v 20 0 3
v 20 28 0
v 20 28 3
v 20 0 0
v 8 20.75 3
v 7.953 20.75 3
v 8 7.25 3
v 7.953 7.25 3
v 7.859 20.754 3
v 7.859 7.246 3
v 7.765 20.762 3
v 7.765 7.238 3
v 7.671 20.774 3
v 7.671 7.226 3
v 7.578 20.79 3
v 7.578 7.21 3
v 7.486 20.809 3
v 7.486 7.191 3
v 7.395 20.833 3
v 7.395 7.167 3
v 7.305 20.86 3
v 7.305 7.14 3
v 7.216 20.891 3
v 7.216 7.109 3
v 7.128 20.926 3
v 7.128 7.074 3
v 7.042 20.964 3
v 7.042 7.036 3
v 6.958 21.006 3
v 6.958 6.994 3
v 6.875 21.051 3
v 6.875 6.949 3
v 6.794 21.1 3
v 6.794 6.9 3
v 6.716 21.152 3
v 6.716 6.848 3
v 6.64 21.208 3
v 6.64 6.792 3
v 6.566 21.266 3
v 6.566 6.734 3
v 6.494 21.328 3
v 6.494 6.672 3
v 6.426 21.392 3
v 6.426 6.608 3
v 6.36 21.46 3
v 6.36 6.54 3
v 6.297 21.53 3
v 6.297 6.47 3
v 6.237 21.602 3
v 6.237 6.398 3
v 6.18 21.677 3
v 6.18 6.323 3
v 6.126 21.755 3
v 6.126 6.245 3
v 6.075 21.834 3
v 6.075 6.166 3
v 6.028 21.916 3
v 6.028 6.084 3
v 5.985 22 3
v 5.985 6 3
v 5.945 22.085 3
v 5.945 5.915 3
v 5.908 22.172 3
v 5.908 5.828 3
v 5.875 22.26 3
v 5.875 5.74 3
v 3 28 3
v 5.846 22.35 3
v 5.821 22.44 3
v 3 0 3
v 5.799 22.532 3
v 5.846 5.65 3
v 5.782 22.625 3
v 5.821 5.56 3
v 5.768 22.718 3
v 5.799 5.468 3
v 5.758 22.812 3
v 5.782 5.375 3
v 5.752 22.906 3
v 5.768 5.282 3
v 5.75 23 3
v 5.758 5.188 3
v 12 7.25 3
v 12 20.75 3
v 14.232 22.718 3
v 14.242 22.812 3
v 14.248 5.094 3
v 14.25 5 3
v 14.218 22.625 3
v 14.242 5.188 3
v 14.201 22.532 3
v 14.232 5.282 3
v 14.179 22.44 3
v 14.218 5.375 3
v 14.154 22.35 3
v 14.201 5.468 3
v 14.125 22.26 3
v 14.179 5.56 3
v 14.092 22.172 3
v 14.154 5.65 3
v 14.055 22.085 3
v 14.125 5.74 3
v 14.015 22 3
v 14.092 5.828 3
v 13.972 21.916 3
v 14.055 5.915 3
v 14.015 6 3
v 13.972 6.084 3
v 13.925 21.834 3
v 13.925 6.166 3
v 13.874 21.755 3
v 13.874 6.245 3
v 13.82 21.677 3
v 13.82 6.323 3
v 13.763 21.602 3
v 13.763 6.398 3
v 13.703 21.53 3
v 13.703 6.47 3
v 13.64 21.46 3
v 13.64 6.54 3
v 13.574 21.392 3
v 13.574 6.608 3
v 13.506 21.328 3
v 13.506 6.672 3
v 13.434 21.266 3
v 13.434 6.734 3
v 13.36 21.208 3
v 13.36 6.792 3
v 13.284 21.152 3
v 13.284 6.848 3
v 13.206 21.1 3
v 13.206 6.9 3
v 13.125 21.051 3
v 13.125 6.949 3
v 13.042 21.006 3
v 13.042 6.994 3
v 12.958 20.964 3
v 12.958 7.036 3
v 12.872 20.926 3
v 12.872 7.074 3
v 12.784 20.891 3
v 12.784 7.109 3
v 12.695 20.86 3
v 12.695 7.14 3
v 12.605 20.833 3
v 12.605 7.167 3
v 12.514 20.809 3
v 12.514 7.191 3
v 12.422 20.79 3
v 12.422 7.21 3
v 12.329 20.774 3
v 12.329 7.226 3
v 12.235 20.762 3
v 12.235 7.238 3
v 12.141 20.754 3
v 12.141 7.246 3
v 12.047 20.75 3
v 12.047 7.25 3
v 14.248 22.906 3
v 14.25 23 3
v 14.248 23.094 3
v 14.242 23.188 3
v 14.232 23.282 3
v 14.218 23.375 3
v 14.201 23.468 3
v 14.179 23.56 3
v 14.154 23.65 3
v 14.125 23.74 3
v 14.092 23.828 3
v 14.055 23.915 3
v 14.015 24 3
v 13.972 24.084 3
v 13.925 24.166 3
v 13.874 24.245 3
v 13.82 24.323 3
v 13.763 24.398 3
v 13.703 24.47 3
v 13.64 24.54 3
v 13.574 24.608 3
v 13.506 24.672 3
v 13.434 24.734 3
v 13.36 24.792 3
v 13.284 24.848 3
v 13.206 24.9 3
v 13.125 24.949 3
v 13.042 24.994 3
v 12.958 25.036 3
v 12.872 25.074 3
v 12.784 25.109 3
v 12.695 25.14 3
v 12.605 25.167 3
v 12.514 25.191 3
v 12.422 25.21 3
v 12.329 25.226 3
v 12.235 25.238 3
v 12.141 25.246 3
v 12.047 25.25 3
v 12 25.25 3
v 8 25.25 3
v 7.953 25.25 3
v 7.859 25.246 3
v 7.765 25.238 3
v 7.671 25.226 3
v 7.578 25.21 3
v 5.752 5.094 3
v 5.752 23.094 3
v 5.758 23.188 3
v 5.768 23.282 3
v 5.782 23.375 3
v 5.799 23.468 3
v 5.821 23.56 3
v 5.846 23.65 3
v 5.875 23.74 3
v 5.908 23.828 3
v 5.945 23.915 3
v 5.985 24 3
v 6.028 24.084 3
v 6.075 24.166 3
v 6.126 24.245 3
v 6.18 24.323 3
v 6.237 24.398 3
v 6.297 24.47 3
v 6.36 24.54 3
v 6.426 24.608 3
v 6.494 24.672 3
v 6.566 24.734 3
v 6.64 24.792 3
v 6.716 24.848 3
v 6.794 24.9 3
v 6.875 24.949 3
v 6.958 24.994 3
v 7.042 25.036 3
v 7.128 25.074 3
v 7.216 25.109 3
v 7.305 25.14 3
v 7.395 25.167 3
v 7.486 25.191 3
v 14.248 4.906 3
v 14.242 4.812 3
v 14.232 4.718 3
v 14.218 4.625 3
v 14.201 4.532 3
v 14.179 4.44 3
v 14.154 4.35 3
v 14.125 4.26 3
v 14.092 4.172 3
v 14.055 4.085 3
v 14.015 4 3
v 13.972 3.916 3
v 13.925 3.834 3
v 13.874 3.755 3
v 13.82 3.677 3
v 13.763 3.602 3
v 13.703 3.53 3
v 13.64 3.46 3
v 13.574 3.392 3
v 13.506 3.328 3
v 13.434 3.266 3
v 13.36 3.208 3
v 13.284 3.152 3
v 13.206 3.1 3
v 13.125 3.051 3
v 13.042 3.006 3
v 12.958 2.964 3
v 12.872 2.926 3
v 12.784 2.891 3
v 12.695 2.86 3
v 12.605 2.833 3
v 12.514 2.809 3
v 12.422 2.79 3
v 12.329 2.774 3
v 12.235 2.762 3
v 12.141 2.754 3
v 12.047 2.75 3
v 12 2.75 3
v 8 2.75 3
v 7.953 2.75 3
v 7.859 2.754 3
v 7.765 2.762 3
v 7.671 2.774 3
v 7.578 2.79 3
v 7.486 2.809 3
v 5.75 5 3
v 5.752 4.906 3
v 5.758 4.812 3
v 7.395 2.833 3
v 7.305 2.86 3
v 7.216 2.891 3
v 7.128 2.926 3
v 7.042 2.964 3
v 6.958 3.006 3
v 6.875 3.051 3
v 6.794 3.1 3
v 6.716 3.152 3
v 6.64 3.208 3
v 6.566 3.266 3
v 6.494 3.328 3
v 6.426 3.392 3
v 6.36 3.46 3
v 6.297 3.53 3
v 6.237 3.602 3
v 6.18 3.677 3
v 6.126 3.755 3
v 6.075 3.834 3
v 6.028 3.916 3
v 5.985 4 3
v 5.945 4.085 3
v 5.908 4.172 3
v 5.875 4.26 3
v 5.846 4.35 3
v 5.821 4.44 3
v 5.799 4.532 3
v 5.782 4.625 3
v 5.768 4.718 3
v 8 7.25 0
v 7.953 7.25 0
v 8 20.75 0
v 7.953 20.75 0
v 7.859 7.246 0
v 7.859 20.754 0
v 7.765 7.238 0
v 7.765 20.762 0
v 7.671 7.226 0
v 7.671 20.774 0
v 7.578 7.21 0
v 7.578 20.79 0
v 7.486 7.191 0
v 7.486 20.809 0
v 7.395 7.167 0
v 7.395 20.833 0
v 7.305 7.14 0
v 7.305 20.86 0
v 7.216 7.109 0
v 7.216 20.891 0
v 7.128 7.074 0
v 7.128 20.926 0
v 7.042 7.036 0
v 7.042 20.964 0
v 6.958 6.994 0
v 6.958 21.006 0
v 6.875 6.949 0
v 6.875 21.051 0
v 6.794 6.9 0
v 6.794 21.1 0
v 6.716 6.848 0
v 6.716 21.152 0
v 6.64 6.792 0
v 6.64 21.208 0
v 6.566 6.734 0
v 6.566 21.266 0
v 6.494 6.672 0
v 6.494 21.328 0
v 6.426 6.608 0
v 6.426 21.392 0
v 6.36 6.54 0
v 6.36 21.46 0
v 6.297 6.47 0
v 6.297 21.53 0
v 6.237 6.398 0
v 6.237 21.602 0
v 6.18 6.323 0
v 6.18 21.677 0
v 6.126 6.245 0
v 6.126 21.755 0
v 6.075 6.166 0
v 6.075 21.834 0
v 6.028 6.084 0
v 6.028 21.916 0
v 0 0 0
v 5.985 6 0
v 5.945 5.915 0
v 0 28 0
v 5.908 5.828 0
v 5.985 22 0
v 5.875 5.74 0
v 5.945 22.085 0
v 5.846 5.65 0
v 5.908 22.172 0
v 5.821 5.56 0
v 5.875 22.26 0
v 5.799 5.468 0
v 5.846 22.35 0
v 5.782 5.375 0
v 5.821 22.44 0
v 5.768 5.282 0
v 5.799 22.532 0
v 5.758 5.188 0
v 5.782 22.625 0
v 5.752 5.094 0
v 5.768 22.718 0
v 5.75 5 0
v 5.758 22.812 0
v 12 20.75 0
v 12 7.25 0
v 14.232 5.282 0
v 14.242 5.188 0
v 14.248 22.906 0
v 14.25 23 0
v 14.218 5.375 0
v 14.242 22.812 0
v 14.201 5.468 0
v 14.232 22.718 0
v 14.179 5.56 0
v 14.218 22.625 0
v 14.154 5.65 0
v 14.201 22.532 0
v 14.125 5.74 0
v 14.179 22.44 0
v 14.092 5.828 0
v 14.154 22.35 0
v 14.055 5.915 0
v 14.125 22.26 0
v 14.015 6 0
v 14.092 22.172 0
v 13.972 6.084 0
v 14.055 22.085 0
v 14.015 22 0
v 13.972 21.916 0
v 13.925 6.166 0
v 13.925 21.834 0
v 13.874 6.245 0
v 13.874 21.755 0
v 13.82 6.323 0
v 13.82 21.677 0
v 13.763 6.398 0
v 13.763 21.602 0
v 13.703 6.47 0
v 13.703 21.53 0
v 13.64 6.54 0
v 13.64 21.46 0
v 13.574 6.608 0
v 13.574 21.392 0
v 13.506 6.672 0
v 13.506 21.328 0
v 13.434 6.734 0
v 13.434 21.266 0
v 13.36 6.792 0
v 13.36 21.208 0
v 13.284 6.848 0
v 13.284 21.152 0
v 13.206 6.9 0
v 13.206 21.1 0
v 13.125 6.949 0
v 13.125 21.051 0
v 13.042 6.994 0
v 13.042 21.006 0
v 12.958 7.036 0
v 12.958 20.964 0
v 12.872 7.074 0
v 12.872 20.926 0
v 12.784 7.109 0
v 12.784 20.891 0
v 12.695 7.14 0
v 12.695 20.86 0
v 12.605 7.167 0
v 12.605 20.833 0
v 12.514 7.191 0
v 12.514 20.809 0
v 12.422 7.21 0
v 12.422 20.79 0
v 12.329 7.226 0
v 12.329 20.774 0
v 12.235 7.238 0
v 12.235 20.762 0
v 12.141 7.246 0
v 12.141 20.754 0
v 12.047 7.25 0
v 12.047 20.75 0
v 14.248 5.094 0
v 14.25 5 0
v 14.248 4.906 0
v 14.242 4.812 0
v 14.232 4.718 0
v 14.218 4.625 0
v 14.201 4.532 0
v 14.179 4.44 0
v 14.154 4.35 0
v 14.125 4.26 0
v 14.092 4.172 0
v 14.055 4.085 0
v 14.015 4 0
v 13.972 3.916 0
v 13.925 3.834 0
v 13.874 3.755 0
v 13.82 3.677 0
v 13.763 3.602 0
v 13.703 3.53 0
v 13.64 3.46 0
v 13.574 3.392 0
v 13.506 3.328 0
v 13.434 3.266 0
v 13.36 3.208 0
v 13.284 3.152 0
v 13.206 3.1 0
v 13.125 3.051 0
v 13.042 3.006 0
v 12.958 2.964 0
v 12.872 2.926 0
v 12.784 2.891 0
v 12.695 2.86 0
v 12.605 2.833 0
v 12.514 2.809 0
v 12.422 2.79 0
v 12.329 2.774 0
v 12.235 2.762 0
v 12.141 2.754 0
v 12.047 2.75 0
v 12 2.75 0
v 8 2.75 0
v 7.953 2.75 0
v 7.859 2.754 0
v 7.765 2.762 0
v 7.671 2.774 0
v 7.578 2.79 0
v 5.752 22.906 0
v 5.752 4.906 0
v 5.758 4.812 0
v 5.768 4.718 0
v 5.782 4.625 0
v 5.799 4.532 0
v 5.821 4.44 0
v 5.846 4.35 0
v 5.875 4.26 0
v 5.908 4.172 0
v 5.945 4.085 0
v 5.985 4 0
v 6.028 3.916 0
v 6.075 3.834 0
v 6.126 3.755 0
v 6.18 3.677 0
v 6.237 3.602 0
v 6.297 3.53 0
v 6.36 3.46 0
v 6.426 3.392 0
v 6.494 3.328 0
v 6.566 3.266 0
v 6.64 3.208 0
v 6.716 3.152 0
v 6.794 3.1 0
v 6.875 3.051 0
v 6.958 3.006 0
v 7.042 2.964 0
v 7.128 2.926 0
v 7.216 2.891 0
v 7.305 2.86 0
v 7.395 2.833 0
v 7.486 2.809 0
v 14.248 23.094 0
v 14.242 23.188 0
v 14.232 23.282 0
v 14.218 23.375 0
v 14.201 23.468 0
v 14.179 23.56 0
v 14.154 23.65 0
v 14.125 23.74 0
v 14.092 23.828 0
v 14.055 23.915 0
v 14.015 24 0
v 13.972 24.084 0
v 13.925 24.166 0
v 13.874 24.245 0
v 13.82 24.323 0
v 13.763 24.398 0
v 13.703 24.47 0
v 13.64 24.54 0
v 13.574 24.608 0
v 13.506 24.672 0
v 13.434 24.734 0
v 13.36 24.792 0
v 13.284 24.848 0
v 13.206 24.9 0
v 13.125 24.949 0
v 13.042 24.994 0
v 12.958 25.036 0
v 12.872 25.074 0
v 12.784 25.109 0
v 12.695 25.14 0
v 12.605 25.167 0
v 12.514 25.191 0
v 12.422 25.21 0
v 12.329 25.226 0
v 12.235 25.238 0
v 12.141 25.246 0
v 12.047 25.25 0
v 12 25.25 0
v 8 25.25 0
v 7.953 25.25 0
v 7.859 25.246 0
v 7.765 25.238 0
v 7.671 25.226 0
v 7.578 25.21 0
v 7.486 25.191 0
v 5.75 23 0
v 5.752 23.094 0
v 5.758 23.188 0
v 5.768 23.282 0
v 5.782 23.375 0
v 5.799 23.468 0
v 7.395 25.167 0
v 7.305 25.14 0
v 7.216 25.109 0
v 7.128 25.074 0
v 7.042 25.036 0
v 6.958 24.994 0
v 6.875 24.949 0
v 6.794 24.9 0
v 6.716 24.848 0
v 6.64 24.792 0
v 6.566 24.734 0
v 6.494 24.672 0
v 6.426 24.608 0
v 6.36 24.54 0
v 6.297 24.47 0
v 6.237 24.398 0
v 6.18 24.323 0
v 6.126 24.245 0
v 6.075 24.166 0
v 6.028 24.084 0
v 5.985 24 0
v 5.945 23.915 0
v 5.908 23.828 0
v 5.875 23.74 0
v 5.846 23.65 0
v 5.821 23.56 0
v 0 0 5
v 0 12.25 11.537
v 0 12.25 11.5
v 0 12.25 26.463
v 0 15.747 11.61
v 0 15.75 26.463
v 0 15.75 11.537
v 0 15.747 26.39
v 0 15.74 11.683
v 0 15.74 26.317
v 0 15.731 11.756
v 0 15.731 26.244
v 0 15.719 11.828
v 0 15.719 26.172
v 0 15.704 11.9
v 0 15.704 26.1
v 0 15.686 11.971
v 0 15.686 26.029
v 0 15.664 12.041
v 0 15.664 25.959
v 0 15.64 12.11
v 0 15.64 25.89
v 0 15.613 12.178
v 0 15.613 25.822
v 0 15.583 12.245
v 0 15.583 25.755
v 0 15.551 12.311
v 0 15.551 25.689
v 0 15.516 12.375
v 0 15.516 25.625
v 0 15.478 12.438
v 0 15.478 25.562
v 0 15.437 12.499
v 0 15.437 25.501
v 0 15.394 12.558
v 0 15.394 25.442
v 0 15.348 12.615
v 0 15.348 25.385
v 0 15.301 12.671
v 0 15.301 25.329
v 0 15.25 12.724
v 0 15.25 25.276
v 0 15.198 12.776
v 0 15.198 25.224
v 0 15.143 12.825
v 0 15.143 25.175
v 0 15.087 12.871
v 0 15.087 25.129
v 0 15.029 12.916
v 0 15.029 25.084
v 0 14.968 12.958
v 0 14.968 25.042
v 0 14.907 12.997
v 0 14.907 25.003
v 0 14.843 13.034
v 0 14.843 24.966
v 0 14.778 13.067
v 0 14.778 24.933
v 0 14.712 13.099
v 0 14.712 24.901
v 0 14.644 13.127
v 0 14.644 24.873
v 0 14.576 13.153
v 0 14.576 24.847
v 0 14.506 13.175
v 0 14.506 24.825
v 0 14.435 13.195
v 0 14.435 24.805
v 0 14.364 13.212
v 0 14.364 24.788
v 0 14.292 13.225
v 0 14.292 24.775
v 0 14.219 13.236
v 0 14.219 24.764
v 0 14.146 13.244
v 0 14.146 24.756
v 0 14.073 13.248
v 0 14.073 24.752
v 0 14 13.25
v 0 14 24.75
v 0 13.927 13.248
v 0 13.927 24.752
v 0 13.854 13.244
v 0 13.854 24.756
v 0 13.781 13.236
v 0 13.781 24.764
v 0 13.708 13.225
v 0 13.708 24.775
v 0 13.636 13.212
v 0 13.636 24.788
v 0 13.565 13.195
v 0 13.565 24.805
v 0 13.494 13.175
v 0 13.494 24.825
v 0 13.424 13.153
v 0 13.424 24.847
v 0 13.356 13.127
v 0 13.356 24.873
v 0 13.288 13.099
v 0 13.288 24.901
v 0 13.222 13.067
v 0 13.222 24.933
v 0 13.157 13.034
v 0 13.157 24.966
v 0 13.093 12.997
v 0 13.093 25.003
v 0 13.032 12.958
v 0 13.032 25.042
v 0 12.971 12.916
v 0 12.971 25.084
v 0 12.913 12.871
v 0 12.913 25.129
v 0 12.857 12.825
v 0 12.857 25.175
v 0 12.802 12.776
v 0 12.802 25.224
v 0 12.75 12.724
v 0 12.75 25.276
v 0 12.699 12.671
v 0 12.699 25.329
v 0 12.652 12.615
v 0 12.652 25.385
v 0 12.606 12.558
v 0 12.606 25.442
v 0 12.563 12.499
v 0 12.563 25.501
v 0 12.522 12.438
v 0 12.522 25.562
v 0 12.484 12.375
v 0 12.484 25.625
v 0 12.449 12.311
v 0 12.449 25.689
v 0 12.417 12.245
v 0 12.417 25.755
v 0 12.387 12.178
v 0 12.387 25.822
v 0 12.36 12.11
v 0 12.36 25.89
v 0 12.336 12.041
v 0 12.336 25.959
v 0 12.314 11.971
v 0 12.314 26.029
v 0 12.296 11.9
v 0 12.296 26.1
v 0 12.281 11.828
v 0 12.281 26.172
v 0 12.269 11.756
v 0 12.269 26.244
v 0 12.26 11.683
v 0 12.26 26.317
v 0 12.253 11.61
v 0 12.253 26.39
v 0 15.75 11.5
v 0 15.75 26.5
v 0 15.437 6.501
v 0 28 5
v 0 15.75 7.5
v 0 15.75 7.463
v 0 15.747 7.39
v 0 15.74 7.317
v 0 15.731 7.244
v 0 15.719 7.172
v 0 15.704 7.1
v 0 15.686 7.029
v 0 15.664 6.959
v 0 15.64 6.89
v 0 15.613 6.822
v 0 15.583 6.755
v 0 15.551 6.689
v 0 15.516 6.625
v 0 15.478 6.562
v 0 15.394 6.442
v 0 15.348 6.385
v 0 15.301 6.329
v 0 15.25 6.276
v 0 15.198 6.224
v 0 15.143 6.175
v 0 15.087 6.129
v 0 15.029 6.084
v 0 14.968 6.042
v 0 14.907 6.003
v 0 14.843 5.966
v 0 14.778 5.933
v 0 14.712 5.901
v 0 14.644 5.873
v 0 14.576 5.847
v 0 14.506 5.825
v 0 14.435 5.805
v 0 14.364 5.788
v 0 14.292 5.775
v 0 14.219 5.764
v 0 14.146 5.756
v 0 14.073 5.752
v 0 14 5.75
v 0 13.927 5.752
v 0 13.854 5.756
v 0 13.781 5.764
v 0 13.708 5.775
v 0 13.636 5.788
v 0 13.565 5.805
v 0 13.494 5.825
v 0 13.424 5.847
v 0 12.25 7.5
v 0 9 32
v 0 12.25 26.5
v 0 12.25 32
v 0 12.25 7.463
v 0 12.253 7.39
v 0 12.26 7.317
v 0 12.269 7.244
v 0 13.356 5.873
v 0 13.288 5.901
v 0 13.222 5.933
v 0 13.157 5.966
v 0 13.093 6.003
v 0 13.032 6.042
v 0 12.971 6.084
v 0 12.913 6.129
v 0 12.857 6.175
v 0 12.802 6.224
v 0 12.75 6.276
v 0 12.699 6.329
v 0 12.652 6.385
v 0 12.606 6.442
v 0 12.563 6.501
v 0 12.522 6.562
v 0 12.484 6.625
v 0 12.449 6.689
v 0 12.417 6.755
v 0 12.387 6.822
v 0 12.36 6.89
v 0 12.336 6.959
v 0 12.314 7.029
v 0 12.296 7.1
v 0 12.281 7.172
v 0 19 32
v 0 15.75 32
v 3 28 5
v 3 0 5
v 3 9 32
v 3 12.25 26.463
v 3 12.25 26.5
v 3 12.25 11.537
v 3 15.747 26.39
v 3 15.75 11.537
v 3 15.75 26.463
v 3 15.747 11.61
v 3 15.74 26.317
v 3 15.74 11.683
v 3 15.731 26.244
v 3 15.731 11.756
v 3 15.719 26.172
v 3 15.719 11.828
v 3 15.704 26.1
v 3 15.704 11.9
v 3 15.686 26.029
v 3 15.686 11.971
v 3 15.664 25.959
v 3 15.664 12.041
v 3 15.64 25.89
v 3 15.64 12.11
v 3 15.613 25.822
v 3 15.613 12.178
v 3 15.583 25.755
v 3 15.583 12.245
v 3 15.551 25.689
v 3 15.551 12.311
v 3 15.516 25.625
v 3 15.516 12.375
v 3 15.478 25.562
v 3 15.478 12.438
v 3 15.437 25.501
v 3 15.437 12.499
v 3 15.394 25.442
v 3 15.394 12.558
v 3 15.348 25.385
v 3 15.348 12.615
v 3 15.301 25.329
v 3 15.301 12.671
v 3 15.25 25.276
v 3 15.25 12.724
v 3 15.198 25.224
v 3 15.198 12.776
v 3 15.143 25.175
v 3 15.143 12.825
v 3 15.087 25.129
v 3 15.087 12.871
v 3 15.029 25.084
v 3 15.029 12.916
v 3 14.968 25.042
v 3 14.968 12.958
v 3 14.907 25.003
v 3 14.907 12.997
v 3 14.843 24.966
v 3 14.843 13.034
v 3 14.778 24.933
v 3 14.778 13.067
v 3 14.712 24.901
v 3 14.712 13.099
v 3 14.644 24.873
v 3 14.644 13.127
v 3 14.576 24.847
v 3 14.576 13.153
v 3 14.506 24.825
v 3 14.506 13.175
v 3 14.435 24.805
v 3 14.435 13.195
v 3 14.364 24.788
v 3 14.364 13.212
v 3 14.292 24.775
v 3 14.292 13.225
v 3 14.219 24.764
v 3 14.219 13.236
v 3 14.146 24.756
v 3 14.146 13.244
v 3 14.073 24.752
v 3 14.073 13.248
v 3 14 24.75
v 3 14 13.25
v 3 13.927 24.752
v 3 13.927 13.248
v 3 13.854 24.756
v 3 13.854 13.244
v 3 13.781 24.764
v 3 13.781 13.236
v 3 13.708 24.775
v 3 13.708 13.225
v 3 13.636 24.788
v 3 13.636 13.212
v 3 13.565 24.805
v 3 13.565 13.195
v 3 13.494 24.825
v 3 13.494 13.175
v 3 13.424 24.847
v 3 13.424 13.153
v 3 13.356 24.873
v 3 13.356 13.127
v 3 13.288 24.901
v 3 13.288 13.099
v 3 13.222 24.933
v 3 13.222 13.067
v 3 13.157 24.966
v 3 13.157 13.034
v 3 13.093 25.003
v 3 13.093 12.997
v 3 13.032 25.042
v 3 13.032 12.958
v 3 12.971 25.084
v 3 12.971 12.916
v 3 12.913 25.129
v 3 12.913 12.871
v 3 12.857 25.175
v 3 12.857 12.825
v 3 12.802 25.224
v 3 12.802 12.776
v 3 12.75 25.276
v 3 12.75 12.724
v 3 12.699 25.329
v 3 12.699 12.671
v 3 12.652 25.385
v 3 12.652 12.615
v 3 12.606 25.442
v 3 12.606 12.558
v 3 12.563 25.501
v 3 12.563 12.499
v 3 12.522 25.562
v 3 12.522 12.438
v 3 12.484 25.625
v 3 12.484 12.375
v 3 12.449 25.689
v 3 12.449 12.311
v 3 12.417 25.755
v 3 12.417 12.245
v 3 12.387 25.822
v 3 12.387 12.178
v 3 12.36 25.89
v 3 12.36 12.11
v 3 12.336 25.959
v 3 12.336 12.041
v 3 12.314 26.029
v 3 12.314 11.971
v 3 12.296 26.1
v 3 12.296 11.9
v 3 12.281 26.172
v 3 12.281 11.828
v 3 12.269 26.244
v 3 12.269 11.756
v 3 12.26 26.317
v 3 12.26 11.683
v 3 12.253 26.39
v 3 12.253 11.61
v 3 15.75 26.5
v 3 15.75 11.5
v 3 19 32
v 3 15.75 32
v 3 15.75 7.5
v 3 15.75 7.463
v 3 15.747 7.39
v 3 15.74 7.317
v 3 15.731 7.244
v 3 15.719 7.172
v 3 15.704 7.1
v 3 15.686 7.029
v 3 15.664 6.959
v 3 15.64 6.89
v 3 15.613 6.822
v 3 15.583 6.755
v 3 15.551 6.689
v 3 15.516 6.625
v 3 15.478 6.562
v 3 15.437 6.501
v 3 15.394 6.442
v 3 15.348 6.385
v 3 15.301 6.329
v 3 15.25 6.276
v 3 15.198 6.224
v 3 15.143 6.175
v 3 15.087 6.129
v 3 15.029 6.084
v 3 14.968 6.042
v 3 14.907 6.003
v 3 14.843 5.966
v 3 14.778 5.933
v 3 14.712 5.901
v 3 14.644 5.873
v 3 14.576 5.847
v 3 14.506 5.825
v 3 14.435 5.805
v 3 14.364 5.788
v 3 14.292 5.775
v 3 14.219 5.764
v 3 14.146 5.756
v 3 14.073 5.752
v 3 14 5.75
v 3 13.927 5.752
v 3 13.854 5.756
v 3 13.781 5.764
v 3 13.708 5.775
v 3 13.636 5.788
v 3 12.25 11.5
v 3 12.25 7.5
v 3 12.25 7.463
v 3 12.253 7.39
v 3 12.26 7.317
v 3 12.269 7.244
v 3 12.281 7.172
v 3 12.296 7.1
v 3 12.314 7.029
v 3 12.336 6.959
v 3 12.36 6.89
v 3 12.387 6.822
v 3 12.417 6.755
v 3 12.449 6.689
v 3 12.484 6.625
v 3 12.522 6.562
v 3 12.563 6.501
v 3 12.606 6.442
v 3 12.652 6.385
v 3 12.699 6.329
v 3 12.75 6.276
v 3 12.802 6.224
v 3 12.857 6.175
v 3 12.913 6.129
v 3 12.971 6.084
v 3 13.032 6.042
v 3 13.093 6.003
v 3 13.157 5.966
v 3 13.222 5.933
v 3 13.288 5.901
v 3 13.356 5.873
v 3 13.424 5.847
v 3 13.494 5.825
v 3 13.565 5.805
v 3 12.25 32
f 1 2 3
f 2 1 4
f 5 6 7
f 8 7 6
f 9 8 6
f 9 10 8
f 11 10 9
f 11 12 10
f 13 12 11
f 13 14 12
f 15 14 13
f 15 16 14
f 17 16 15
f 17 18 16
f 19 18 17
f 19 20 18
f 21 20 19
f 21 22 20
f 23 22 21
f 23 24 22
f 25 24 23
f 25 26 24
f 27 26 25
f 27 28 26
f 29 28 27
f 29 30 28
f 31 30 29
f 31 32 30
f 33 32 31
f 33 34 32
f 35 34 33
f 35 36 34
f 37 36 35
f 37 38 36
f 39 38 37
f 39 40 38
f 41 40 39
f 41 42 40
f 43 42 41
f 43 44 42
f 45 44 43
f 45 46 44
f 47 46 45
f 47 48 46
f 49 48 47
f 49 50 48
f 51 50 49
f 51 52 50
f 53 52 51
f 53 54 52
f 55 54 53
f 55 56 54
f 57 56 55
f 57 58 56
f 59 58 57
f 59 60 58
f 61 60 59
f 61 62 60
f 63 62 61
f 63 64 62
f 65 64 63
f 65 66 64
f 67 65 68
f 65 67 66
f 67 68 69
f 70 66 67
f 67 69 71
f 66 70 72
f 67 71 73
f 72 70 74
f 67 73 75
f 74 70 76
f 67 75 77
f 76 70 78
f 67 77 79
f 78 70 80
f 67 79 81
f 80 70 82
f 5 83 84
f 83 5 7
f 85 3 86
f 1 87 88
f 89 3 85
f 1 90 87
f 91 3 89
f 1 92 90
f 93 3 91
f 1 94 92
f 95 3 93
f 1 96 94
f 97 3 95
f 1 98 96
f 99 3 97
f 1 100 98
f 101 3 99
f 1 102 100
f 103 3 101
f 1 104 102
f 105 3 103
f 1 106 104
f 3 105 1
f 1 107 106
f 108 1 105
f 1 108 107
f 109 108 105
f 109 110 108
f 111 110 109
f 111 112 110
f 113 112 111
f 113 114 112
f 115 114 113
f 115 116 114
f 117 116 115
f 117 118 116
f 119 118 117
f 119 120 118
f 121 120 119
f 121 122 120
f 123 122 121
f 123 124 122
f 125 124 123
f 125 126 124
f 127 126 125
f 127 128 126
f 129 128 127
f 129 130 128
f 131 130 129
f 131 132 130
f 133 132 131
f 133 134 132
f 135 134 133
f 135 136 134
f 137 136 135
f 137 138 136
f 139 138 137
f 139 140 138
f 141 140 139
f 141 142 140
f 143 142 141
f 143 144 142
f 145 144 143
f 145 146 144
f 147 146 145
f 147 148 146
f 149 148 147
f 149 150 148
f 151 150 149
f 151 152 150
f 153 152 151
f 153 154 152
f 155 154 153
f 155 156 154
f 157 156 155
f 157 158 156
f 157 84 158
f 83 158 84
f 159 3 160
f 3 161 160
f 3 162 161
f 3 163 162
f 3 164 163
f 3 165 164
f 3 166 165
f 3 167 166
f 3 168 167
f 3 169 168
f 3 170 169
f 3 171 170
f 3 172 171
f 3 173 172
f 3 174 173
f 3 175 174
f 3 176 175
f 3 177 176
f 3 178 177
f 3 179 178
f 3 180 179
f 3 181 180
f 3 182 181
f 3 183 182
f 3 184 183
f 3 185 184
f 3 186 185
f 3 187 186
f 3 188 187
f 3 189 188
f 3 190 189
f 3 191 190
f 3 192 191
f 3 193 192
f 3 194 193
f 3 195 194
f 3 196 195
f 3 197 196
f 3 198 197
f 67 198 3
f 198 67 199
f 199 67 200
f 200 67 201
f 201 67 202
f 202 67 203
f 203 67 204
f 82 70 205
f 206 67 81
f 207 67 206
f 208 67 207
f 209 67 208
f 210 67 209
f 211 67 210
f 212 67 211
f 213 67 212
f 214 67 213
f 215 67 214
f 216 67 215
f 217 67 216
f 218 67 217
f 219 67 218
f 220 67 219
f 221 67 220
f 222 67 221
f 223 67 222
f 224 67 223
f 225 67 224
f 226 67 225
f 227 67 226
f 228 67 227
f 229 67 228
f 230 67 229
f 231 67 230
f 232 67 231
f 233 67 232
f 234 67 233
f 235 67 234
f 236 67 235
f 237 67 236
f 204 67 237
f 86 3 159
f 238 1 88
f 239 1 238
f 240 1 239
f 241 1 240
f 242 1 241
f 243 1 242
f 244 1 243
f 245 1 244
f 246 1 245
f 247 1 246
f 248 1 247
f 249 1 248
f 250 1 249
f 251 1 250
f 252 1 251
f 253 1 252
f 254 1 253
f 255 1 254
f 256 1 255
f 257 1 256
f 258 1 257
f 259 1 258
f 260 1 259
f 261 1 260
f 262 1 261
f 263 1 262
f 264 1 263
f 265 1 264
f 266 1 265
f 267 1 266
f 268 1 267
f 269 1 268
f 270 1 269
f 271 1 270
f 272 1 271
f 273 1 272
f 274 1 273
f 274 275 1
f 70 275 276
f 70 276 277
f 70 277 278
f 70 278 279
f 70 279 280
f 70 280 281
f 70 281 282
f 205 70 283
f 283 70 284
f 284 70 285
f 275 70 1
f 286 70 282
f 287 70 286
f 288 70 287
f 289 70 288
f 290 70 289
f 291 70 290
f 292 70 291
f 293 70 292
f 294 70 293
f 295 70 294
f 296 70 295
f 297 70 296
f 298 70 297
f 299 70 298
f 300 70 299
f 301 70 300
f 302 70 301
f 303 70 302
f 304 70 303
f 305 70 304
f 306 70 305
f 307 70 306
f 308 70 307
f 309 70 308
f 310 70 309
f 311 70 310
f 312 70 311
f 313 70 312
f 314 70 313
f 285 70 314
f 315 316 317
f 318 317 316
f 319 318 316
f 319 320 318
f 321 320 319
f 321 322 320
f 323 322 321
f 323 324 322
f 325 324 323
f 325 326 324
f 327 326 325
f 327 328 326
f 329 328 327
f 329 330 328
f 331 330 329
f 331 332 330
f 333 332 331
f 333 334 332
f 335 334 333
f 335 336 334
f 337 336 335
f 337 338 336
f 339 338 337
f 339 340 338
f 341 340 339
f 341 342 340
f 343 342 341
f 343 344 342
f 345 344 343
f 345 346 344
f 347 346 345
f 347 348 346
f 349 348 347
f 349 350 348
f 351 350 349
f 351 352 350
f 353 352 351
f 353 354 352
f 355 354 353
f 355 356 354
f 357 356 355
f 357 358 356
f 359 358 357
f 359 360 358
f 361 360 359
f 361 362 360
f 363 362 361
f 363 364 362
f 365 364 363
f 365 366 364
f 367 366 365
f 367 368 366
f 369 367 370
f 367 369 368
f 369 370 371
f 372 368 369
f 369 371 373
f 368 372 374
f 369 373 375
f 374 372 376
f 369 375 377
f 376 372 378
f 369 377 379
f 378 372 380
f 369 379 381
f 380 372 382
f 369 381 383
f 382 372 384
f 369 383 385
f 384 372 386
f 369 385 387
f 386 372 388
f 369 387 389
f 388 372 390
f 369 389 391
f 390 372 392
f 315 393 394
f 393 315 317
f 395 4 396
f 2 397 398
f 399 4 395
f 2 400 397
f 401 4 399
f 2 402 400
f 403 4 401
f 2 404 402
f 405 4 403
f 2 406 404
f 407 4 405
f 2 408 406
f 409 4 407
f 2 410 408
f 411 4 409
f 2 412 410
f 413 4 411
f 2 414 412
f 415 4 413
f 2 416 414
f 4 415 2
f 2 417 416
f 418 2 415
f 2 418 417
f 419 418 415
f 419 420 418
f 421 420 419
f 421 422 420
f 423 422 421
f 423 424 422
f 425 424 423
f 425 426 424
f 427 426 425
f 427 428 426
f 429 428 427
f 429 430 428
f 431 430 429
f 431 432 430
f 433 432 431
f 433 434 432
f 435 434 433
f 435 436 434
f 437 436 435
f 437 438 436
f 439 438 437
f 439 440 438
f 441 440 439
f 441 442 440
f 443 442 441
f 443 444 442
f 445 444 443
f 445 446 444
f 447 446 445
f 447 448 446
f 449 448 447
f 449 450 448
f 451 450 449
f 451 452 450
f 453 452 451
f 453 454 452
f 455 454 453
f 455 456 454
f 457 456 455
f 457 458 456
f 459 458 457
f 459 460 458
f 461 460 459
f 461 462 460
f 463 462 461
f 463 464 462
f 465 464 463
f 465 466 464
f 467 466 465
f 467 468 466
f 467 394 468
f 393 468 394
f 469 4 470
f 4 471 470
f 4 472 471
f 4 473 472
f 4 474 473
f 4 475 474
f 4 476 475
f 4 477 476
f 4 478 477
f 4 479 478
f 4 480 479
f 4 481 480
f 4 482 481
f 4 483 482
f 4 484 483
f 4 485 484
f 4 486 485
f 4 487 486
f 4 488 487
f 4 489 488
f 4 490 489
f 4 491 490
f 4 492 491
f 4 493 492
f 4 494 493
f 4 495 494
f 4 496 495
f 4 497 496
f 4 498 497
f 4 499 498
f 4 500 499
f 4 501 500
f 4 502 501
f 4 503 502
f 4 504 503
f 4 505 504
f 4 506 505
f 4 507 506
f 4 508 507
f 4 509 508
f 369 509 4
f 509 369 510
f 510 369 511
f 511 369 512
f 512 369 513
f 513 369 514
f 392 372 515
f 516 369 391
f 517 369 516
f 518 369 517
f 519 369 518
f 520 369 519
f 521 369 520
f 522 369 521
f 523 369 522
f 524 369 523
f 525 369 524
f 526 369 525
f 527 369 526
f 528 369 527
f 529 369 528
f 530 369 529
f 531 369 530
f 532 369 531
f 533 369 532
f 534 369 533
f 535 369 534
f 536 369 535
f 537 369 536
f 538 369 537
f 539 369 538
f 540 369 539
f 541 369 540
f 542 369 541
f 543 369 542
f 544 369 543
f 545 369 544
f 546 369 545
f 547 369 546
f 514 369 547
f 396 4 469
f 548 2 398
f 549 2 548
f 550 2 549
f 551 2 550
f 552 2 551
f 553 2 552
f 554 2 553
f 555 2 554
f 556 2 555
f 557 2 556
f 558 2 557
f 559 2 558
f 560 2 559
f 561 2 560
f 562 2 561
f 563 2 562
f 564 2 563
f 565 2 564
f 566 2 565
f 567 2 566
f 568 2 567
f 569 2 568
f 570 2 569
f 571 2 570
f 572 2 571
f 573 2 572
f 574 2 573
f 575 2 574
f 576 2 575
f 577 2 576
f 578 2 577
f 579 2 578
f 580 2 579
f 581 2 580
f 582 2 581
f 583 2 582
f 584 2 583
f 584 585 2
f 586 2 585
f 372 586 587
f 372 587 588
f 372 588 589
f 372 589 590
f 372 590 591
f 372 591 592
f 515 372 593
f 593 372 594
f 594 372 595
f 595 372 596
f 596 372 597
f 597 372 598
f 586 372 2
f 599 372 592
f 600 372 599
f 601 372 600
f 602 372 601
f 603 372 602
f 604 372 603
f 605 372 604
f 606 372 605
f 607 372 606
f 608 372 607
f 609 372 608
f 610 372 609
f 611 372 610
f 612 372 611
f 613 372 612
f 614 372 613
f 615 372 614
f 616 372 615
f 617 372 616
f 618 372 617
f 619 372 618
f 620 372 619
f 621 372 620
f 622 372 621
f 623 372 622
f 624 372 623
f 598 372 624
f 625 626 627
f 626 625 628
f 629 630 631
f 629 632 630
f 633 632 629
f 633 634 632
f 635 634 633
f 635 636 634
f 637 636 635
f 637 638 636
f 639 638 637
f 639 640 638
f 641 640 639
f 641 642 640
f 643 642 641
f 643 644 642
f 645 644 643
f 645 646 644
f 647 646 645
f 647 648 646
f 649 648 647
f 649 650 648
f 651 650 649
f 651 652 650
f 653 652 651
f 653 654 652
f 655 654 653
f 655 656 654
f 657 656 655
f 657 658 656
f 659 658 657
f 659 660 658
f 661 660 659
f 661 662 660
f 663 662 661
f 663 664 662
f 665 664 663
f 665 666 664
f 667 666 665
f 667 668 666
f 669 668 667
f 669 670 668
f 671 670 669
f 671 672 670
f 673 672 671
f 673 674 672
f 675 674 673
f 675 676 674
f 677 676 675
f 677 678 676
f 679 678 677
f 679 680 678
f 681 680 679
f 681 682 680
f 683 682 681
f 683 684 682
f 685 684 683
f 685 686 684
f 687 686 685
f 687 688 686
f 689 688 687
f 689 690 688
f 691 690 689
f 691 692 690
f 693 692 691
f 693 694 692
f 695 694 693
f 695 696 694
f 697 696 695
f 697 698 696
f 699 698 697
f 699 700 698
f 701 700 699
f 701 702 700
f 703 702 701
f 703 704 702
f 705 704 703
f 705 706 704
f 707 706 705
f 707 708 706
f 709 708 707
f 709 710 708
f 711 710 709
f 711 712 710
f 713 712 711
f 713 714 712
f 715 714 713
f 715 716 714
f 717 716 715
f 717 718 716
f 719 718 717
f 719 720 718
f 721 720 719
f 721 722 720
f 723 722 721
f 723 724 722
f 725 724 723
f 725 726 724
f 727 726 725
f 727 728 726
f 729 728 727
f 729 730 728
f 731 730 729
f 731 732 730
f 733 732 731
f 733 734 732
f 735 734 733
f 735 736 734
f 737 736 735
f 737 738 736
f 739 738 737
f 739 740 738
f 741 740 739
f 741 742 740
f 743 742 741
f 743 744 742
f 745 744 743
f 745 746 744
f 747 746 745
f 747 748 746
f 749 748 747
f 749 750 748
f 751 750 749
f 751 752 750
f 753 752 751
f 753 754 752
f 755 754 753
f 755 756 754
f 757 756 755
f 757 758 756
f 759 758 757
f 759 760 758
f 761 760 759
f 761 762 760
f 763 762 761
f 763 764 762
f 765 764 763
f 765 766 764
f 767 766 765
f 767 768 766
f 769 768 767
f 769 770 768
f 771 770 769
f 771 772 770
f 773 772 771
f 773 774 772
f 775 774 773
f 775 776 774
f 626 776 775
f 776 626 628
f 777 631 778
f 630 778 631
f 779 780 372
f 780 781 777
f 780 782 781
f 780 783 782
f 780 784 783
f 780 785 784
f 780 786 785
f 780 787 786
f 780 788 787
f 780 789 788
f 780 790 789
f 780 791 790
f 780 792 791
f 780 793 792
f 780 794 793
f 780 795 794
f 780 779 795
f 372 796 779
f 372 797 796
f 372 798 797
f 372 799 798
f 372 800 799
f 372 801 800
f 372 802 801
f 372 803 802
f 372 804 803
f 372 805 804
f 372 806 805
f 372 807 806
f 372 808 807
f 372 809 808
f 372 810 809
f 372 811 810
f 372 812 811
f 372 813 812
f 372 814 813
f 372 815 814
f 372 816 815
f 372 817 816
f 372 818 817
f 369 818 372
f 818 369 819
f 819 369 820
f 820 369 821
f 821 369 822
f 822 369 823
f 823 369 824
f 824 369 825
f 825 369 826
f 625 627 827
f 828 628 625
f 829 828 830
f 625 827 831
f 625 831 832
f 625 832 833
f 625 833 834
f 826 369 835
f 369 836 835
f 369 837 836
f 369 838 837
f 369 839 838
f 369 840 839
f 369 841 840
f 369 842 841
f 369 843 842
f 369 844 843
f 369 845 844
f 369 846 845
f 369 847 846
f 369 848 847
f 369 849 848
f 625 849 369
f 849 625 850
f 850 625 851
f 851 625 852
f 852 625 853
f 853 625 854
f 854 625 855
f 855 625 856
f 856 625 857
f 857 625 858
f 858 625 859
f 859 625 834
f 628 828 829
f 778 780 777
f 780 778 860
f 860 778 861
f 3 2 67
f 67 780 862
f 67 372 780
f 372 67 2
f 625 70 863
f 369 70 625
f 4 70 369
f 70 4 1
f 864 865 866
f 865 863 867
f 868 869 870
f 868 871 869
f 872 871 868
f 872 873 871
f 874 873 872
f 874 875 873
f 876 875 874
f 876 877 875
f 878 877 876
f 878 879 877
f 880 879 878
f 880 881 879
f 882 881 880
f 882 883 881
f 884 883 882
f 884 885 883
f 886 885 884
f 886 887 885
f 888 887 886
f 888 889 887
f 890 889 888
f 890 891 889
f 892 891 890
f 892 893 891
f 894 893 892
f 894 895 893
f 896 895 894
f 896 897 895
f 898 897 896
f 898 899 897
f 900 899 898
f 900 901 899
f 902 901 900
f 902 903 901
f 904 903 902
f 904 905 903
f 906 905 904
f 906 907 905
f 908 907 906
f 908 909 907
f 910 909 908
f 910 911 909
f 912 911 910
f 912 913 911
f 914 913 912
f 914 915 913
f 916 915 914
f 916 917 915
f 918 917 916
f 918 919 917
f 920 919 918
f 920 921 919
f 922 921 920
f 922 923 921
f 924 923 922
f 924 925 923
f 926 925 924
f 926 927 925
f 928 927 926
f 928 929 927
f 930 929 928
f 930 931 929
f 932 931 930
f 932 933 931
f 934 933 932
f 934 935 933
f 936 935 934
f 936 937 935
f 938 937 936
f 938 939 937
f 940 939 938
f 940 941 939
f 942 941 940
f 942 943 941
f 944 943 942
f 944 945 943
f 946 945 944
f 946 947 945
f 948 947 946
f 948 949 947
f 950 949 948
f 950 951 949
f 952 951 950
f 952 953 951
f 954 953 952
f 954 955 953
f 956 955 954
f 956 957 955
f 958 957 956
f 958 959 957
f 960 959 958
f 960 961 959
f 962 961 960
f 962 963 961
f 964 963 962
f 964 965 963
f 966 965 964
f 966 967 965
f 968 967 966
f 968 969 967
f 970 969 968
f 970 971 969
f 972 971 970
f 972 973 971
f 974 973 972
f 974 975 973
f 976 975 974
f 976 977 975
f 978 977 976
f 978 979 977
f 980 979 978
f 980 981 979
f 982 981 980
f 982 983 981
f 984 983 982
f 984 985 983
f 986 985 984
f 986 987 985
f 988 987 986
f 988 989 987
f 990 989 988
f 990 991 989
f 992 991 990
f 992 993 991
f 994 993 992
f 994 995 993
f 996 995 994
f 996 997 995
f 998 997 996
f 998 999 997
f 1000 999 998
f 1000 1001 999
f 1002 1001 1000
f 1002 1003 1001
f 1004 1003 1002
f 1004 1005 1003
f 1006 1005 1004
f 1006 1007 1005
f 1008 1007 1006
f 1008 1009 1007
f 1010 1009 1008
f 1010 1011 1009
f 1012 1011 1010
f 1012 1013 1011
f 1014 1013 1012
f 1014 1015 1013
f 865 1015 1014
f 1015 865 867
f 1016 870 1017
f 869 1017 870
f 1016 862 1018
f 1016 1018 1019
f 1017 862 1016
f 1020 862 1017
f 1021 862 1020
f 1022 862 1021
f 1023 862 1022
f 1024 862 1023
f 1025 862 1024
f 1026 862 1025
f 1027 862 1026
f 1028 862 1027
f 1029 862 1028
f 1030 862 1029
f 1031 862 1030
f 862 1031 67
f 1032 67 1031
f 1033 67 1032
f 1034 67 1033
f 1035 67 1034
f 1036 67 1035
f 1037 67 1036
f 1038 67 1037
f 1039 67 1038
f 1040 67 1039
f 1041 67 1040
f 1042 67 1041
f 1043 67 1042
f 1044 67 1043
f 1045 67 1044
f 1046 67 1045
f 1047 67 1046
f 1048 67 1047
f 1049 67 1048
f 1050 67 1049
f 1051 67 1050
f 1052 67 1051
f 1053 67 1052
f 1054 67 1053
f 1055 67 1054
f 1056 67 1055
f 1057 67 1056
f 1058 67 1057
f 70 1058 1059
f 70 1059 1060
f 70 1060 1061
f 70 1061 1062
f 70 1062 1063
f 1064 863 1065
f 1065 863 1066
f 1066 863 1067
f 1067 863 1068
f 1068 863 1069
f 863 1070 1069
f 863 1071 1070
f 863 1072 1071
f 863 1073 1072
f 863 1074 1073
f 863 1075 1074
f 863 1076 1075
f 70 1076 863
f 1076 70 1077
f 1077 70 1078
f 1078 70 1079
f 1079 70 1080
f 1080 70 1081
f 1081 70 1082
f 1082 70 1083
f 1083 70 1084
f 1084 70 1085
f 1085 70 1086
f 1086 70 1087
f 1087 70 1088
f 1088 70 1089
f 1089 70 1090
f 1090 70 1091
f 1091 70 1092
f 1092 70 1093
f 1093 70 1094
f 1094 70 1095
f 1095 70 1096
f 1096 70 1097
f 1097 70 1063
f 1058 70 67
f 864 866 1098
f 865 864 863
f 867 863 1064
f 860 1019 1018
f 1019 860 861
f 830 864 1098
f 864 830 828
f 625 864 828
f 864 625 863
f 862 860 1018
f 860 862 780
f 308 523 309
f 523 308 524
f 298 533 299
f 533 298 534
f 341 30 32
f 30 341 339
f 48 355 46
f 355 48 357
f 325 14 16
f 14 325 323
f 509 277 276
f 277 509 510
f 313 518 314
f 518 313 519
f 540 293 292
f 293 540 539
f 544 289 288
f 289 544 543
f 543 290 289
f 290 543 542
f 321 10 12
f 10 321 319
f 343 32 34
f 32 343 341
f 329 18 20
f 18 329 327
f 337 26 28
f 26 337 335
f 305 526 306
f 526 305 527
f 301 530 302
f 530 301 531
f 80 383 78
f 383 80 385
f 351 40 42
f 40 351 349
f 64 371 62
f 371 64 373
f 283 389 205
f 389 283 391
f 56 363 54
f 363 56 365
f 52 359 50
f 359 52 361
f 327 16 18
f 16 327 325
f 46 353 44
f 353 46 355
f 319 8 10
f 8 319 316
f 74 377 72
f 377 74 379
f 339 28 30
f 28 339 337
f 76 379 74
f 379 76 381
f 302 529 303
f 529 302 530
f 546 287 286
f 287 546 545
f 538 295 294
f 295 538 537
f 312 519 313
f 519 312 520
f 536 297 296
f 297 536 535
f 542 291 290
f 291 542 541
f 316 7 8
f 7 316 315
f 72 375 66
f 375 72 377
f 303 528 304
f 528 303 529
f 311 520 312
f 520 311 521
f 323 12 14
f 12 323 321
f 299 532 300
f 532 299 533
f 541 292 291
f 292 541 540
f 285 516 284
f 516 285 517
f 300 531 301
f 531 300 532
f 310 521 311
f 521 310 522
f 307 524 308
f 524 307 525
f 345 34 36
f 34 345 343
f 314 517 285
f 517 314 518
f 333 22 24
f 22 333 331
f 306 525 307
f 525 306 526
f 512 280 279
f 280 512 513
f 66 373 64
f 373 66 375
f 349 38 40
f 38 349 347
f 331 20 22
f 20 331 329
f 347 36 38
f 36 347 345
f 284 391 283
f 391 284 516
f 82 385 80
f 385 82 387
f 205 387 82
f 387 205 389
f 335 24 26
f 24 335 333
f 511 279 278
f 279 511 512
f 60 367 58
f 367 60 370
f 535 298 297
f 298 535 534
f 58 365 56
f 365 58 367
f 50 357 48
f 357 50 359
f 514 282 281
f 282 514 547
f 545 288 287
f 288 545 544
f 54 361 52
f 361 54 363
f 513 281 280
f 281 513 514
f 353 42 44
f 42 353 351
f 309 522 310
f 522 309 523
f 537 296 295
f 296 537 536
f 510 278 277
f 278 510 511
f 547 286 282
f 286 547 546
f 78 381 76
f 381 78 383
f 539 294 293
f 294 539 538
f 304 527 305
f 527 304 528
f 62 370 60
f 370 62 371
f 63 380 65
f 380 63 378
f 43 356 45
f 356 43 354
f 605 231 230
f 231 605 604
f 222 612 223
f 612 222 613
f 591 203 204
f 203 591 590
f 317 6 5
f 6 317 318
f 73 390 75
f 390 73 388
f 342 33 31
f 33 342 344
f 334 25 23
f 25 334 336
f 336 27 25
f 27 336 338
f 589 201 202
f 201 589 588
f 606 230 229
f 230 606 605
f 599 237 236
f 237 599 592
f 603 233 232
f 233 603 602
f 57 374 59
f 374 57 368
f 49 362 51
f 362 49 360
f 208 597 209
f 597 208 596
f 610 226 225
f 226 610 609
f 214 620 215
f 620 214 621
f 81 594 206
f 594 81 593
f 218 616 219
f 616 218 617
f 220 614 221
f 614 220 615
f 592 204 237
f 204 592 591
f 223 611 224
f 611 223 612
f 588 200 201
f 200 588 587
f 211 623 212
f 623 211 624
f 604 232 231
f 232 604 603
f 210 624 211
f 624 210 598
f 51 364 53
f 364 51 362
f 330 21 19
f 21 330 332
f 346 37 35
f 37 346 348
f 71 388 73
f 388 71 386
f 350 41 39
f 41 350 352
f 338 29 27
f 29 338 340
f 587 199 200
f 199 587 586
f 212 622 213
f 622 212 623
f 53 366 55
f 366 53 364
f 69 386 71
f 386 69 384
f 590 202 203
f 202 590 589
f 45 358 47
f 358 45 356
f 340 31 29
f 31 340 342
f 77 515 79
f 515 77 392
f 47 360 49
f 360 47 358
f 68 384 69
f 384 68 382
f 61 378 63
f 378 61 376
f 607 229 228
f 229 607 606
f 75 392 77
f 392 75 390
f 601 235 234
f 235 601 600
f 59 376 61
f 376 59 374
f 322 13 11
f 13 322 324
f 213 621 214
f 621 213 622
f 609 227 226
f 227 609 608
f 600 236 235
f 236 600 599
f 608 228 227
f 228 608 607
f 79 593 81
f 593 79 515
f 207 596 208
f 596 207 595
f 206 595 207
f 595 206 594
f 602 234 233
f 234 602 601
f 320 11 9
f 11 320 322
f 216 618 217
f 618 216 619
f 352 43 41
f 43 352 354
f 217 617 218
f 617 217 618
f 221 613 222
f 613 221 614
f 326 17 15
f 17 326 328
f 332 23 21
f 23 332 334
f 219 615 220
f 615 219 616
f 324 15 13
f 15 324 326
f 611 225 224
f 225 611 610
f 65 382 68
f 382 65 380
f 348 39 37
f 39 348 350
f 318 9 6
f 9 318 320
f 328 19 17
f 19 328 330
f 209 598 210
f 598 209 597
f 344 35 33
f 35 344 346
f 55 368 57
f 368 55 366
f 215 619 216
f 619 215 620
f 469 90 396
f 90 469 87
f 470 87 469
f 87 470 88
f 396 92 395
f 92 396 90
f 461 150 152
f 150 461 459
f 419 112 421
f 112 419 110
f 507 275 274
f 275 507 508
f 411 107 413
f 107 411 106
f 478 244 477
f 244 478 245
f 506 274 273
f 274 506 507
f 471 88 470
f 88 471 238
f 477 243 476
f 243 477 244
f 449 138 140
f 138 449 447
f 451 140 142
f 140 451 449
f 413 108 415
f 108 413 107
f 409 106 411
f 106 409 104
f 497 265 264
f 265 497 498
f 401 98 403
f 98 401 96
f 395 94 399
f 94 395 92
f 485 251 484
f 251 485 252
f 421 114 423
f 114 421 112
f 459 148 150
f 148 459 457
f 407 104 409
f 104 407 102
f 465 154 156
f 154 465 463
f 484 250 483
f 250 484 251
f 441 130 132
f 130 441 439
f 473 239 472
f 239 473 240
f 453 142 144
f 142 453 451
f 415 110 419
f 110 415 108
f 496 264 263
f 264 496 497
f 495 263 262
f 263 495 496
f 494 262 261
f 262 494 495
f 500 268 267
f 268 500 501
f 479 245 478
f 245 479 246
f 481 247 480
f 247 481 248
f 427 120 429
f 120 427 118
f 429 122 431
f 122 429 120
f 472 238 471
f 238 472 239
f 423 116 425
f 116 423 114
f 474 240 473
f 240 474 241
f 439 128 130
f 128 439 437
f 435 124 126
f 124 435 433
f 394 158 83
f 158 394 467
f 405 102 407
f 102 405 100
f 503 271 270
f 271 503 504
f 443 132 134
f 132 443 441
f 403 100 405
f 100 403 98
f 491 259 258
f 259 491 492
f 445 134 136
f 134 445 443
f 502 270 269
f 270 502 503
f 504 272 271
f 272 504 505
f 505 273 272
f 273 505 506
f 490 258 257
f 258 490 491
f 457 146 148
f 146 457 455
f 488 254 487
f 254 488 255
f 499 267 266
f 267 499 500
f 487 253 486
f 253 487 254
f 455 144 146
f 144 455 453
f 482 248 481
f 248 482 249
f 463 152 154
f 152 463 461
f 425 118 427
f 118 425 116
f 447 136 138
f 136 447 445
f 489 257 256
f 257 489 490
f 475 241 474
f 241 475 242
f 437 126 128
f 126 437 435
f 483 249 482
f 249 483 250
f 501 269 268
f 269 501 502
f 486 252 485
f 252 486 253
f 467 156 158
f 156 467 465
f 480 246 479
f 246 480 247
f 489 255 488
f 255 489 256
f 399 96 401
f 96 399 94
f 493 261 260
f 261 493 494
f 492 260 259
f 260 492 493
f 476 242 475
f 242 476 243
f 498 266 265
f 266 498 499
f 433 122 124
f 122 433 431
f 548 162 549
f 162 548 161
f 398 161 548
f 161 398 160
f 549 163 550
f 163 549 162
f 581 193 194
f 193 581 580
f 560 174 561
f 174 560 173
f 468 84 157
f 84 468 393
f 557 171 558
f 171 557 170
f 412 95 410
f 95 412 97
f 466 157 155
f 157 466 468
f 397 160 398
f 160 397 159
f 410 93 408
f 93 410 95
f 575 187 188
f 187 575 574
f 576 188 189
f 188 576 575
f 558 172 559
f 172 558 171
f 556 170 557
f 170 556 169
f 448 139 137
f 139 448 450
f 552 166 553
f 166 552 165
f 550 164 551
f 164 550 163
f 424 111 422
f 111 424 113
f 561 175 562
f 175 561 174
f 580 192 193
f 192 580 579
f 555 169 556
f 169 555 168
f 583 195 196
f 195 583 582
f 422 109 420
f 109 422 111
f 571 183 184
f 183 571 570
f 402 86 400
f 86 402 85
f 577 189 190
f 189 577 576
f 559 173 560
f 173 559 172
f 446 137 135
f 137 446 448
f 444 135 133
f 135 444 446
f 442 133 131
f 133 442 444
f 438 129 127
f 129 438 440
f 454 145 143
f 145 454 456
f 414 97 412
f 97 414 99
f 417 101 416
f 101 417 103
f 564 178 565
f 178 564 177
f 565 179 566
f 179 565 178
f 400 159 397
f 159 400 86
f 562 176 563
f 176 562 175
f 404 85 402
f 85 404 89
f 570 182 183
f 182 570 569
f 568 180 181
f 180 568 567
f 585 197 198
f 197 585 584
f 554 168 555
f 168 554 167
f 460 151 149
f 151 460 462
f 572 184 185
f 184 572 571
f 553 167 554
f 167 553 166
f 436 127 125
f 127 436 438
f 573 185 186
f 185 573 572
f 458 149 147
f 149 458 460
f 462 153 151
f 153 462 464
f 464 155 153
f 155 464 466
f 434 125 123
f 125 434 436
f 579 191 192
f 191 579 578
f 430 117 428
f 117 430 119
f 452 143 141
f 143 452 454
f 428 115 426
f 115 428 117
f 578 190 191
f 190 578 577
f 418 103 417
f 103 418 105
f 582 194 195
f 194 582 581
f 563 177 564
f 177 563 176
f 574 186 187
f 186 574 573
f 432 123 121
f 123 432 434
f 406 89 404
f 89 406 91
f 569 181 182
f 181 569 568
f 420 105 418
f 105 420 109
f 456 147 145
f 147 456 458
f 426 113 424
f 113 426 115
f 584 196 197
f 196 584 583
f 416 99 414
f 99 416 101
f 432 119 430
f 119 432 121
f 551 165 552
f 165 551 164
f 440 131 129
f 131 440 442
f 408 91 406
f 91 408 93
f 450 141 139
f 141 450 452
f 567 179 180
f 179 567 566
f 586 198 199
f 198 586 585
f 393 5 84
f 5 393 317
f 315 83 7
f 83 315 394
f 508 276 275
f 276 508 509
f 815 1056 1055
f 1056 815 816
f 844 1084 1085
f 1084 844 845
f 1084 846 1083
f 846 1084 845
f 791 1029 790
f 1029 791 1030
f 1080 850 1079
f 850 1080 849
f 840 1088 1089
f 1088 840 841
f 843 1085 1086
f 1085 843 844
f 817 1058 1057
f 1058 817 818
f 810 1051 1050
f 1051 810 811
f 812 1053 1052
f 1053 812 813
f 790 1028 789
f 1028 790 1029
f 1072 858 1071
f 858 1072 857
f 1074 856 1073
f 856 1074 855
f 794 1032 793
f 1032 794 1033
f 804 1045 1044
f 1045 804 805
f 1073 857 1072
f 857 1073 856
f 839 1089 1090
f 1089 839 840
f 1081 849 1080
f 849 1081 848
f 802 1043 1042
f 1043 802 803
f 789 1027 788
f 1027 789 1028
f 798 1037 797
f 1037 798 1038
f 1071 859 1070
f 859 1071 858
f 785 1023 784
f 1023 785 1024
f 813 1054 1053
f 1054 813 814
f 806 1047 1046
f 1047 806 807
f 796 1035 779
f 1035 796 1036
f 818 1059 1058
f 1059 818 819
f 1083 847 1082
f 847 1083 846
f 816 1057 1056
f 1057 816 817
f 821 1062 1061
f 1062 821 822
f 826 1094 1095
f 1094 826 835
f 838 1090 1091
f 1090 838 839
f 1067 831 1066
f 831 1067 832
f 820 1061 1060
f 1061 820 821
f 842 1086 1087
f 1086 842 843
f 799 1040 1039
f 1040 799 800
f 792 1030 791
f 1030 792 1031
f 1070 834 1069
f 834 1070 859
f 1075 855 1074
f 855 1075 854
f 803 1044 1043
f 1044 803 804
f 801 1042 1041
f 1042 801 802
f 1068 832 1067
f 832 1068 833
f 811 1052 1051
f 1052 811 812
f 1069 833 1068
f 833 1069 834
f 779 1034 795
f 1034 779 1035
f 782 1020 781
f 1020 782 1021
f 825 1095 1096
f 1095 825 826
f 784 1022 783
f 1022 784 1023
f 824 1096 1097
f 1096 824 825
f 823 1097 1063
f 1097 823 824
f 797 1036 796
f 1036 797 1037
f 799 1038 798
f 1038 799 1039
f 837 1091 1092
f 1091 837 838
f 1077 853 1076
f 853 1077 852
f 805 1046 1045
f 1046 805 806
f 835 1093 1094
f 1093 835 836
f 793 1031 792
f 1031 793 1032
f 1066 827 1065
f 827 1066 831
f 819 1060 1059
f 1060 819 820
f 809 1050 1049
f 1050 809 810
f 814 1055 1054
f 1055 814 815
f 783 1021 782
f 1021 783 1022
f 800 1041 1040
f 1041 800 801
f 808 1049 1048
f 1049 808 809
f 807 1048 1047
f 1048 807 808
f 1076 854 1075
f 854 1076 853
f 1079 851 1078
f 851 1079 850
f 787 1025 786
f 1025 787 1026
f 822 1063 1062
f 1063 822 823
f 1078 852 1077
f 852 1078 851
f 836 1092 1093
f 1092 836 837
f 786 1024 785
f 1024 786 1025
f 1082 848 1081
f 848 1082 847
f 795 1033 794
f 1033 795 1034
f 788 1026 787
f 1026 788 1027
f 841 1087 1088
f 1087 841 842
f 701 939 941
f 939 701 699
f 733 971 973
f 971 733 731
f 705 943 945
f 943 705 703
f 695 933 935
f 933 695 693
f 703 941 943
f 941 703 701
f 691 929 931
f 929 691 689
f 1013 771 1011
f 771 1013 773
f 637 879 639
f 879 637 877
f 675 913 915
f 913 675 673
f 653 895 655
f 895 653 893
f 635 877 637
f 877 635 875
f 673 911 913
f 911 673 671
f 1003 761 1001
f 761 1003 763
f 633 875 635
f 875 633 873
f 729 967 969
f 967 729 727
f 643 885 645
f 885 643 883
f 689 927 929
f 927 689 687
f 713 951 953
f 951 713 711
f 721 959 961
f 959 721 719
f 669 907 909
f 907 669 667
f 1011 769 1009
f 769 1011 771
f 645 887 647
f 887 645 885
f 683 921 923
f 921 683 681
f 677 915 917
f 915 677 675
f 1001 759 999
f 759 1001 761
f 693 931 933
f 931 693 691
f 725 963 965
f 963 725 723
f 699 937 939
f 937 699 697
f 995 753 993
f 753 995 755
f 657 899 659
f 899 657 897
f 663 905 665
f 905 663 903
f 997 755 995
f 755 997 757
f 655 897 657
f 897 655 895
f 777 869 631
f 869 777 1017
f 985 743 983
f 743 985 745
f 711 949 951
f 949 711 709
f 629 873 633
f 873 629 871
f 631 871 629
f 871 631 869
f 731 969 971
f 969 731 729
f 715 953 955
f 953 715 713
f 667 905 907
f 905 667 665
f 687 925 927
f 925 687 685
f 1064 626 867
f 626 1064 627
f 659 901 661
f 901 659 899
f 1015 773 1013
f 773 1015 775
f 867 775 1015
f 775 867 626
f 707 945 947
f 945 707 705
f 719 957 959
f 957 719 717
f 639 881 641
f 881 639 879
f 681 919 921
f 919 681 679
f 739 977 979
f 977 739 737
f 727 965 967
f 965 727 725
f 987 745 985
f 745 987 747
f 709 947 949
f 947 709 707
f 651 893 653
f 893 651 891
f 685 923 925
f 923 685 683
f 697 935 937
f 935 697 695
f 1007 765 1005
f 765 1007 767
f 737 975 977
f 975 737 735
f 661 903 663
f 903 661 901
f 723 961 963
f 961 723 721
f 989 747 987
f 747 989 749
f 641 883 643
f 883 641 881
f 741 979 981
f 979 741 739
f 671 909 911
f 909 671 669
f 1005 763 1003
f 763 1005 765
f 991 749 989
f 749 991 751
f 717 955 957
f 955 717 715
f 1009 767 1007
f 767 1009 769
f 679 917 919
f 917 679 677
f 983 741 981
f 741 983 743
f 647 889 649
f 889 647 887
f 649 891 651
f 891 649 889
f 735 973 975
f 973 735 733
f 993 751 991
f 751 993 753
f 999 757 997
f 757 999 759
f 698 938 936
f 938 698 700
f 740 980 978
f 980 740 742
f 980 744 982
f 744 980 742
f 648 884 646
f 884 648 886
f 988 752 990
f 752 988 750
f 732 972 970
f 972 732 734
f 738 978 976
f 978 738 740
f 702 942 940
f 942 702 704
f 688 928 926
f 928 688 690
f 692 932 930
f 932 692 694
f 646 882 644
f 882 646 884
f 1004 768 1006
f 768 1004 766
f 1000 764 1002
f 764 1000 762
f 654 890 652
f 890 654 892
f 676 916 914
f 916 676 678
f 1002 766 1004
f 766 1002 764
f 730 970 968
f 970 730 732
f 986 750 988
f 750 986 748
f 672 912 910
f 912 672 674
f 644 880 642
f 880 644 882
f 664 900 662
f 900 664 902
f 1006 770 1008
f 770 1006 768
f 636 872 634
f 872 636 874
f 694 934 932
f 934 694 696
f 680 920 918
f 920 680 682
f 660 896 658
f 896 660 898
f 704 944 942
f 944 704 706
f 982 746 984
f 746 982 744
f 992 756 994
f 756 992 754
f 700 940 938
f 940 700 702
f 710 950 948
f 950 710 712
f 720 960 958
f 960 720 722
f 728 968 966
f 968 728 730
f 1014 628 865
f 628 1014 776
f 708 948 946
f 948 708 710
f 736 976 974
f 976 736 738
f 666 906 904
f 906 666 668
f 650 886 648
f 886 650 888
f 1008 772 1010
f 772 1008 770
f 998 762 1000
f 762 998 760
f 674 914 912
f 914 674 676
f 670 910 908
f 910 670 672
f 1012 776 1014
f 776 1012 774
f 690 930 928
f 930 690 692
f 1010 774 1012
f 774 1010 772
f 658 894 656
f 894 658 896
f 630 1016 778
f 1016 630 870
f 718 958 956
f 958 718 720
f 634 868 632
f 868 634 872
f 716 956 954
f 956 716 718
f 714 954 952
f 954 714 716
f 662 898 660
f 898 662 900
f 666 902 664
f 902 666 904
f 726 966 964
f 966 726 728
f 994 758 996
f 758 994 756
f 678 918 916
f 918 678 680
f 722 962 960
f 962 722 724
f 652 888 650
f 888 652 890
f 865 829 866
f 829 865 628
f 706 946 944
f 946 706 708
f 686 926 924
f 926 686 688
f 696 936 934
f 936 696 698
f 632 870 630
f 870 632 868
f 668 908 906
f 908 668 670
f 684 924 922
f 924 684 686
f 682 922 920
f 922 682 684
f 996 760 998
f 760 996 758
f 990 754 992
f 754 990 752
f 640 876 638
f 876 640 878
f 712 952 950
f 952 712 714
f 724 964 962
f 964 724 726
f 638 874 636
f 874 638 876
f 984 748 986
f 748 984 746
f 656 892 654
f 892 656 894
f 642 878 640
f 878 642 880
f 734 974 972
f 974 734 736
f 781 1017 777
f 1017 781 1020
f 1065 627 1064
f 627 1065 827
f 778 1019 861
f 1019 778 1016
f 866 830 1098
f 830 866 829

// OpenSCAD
$fn=150;
difference(){
union(){
cube([20,28,3],false);

cube([3,28,2+3]);
    rotate ([90,0,90])
    linear_extrude(height = 3)
    polygon([[0,0],[28,0],[28,5],[19,32],[9,32],[0,5]]);
}
translate([8,5,-3.1])
    cylinder(h=6.2,d=4.5);
translate([8,23,-3.1])
    cylinder(h=6.2,d=4.5);
    
translate([12,5,-3.1])
    cylinder(h=6.2,d=4.5);
translate([12,23,-3.1])
    cylinder(h=6.2,d=4.5);

translate([8,23-4.5/2,-0.05])
cube([12-8,4.5,3.1]);
translate([8,5-4.5/2,-0.05])
cube([12-8,4.5,3.1]);

translate([-0.1,14,7.5])
    rotate([0,90,0])
        cylinder(h=4,d=3.5);
translate([-0.1,14,11.5])
    rotate([0,90,0])
        cylinder(h=4,d=3.5);
translate([-0.1,14,26.5])
    rotate([0,90,0])
        cylinder(h=4,d=3.5);
        translate([-0.1,14,30.5])
    rotate([0,90,0])
        cylinder(h=4,d=3.5);
        
translate([-0.1,14-3.5/2,7.5])
    cube([4,3.5,4]);
    translate([-0.1,14-3.5/2,26.5])
    cube([4,3.5,8]);
}
